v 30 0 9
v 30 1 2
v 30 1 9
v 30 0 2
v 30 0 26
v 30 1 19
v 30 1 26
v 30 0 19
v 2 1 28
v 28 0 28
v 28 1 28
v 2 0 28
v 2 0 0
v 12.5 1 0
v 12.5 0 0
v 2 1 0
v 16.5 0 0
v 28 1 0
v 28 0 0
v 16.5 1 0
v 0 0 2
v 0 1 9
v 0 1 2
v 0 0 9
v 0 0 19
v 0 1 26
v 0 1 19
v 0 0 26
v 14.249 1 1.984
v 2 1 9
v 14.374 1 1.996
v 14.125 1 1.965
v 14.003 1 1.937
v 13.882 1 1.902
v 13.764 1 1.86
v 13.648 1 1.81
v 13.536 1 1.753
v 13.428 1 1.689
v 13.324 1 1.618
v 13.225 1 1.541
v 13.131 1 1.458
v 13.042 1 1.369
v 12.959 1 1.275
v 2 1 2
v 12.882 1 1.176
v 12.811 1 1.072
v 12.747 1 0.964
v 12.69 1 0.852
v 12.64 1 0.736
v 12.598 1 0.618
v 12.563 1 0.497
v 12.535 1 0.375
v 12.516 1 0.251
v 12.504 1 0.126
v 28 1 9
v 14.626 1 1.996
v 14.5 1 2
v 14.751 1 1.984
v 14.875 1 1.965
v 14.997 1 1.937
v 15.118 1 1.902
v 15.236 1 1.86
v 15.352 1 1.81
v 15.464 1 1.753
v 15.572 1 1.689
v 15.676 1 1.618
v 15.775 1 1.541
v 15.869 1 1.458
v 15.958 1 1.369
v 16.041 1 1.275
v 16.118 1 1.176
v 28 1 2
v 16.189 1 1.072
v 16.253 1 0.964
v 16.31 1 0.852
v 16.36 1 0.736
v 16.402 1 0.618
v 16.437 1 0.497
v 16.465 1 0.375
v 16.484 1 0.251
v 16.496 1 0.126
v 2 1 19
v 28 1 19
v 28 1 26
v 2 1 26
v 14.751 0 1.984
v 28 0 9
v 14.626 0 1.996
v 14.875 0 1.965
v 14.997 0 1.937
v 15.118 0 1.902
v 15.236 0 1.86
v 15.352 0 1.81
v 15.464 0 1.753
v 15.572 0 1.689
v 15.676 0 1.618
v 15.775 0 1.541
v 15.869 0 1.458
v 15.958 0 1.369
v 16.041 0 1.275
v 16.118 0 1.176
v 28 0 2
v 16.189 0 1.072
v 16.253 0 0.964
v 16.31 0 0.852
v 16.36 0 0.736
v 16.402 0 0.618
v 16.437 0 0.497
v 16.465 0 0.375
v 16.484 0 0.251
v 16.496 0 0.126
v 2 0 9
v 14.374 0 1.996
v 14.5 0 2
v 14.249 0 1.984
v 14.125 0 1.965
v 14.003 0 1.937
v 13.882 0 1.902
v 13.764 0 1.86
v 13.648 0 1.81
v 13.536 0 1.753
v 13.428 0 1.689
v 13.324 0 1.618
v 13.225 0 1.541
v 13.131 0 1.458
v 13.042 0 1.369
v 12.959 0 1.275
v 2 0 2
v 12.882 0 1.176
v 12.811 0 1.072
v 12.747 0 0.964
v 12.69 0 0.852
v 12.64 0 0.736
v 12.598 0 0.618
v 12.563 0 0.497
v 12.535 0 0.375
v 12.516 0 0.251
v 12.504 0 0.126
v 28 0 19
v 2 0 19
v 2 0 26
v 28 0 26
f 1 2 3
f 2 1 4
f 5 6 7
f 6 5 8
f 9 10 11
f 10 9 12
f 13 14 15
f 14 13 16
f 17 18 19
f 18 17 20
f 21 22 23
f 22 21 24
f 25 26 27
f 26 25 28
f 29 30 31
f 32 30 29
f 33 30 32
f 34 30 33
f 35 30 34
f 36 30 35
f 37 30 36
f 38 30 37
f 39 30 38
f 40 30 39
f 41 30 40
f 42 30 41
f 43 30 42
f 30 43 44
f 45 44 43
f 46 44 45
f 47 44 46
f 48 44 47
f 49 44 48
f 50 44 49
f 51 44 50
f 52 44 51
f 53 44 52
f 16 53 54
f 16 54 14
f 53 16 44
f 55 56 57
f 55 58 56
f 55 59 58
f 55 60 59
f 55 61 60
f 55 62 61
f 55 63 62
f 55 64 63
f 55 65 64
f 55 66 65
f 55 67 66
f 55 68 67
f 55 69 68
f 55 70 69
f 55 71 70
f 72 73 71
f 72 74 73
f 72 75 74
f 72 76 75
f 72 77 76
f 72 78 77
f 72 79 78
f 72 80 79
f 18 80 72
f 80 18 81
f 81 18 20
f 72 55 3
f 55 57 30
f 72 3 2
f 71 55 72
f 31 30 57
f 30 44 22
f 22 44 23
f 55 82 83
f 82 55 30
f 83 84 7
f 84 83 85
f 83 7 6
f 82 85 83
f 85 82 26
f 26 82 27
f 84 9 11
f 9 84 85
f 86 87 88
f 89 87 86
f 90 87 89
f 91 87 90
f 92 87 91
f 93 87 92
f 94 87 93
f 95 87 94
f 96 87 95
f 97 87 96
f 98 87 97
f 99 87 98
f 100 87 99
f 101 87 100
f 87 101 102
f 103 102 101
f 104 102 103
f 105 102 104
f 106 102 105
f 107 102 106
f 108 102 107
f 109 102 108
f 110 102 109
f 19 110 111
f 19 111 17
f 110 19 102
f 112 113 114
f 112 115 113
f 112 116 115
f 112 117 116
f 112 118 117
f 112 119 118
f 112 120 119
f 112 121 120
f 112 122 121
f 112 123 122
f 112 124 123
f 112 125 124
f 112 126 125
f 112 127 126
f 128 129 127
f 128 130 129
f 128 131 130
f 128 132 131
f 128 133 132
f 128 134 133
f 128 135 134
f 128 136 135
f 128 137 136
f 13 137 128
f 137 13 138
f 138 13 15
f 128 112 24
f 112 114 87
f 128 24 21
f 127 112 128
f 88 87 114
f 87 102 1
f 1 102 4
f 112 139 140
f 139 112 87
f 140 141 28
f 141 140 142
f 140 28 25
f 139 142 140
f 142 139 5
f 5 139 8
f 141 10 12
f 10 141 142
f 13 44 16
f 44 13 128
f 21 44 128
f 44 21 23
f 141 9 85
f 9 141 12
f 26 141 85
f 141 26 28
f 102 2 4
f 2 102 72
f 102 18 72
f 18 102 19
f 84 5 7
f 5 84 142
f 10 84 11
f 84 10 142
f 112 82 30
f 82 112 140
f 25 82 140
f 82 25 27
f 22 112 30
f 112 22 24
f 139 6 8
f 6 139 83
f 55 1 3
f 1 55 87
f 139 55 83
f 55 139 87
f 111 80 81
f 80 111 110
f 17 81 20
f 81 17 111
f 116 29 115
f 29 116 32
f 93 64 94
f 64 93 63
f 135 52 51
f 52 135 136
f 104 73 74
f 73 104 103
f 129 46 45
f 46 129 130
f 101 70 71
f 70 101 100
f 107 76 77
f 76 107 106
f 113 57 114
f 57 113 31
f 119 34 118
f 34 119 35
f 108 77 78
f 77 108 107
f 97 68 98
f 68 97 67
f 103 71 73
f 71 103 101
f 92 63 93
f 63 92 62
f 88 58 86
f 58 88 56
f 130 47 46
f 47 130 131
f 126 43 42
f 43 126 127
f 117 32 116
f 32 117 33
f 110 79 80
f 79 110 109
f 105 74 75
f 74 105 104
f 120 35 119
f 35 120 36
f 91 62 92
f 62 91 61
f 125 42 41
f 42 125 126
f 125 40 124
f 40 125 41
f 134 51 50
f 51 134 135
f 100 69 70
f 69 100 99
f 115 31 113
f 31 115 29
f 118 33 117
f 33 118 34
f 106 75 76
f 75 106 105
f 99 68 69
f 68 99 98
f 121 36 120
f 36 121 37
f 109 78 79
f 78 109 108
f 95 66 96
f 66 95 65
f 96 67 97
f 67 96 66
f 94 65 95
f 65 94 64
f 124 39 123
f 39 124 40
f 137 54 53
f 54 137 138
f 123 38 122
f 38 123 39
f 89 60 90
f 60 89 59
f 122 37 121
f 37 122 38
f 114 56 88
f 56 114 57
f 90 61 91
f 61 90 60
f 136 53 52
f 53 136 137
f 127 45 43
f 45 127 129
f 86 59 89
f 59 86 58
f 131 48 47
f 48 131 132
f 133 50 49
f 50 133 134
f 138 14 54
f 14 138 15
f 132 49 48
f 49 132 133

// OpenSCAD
difference()
{
color("red")translate([0,0,0])cube([30,1,28]);

//Corners
color("green")translate([-1,-1,-1])cube(3);
color("green")translate([-1,-1,26])cube(3);

color("green")translate([28,-1,-1])cube(3);
color("green")translate([28,-1,26])cube(3);

//Middle Sections
color("blue")translate([-1,-1,9])cube([3,3,10]);

color("blue")translate([28,-1,9])cube([3,3,10]);

//Bottom Hoopla
    color("white")translate([14.5,2,0])rotate([90,0,0])cylinder(5,2,2, $fn=100);
}
